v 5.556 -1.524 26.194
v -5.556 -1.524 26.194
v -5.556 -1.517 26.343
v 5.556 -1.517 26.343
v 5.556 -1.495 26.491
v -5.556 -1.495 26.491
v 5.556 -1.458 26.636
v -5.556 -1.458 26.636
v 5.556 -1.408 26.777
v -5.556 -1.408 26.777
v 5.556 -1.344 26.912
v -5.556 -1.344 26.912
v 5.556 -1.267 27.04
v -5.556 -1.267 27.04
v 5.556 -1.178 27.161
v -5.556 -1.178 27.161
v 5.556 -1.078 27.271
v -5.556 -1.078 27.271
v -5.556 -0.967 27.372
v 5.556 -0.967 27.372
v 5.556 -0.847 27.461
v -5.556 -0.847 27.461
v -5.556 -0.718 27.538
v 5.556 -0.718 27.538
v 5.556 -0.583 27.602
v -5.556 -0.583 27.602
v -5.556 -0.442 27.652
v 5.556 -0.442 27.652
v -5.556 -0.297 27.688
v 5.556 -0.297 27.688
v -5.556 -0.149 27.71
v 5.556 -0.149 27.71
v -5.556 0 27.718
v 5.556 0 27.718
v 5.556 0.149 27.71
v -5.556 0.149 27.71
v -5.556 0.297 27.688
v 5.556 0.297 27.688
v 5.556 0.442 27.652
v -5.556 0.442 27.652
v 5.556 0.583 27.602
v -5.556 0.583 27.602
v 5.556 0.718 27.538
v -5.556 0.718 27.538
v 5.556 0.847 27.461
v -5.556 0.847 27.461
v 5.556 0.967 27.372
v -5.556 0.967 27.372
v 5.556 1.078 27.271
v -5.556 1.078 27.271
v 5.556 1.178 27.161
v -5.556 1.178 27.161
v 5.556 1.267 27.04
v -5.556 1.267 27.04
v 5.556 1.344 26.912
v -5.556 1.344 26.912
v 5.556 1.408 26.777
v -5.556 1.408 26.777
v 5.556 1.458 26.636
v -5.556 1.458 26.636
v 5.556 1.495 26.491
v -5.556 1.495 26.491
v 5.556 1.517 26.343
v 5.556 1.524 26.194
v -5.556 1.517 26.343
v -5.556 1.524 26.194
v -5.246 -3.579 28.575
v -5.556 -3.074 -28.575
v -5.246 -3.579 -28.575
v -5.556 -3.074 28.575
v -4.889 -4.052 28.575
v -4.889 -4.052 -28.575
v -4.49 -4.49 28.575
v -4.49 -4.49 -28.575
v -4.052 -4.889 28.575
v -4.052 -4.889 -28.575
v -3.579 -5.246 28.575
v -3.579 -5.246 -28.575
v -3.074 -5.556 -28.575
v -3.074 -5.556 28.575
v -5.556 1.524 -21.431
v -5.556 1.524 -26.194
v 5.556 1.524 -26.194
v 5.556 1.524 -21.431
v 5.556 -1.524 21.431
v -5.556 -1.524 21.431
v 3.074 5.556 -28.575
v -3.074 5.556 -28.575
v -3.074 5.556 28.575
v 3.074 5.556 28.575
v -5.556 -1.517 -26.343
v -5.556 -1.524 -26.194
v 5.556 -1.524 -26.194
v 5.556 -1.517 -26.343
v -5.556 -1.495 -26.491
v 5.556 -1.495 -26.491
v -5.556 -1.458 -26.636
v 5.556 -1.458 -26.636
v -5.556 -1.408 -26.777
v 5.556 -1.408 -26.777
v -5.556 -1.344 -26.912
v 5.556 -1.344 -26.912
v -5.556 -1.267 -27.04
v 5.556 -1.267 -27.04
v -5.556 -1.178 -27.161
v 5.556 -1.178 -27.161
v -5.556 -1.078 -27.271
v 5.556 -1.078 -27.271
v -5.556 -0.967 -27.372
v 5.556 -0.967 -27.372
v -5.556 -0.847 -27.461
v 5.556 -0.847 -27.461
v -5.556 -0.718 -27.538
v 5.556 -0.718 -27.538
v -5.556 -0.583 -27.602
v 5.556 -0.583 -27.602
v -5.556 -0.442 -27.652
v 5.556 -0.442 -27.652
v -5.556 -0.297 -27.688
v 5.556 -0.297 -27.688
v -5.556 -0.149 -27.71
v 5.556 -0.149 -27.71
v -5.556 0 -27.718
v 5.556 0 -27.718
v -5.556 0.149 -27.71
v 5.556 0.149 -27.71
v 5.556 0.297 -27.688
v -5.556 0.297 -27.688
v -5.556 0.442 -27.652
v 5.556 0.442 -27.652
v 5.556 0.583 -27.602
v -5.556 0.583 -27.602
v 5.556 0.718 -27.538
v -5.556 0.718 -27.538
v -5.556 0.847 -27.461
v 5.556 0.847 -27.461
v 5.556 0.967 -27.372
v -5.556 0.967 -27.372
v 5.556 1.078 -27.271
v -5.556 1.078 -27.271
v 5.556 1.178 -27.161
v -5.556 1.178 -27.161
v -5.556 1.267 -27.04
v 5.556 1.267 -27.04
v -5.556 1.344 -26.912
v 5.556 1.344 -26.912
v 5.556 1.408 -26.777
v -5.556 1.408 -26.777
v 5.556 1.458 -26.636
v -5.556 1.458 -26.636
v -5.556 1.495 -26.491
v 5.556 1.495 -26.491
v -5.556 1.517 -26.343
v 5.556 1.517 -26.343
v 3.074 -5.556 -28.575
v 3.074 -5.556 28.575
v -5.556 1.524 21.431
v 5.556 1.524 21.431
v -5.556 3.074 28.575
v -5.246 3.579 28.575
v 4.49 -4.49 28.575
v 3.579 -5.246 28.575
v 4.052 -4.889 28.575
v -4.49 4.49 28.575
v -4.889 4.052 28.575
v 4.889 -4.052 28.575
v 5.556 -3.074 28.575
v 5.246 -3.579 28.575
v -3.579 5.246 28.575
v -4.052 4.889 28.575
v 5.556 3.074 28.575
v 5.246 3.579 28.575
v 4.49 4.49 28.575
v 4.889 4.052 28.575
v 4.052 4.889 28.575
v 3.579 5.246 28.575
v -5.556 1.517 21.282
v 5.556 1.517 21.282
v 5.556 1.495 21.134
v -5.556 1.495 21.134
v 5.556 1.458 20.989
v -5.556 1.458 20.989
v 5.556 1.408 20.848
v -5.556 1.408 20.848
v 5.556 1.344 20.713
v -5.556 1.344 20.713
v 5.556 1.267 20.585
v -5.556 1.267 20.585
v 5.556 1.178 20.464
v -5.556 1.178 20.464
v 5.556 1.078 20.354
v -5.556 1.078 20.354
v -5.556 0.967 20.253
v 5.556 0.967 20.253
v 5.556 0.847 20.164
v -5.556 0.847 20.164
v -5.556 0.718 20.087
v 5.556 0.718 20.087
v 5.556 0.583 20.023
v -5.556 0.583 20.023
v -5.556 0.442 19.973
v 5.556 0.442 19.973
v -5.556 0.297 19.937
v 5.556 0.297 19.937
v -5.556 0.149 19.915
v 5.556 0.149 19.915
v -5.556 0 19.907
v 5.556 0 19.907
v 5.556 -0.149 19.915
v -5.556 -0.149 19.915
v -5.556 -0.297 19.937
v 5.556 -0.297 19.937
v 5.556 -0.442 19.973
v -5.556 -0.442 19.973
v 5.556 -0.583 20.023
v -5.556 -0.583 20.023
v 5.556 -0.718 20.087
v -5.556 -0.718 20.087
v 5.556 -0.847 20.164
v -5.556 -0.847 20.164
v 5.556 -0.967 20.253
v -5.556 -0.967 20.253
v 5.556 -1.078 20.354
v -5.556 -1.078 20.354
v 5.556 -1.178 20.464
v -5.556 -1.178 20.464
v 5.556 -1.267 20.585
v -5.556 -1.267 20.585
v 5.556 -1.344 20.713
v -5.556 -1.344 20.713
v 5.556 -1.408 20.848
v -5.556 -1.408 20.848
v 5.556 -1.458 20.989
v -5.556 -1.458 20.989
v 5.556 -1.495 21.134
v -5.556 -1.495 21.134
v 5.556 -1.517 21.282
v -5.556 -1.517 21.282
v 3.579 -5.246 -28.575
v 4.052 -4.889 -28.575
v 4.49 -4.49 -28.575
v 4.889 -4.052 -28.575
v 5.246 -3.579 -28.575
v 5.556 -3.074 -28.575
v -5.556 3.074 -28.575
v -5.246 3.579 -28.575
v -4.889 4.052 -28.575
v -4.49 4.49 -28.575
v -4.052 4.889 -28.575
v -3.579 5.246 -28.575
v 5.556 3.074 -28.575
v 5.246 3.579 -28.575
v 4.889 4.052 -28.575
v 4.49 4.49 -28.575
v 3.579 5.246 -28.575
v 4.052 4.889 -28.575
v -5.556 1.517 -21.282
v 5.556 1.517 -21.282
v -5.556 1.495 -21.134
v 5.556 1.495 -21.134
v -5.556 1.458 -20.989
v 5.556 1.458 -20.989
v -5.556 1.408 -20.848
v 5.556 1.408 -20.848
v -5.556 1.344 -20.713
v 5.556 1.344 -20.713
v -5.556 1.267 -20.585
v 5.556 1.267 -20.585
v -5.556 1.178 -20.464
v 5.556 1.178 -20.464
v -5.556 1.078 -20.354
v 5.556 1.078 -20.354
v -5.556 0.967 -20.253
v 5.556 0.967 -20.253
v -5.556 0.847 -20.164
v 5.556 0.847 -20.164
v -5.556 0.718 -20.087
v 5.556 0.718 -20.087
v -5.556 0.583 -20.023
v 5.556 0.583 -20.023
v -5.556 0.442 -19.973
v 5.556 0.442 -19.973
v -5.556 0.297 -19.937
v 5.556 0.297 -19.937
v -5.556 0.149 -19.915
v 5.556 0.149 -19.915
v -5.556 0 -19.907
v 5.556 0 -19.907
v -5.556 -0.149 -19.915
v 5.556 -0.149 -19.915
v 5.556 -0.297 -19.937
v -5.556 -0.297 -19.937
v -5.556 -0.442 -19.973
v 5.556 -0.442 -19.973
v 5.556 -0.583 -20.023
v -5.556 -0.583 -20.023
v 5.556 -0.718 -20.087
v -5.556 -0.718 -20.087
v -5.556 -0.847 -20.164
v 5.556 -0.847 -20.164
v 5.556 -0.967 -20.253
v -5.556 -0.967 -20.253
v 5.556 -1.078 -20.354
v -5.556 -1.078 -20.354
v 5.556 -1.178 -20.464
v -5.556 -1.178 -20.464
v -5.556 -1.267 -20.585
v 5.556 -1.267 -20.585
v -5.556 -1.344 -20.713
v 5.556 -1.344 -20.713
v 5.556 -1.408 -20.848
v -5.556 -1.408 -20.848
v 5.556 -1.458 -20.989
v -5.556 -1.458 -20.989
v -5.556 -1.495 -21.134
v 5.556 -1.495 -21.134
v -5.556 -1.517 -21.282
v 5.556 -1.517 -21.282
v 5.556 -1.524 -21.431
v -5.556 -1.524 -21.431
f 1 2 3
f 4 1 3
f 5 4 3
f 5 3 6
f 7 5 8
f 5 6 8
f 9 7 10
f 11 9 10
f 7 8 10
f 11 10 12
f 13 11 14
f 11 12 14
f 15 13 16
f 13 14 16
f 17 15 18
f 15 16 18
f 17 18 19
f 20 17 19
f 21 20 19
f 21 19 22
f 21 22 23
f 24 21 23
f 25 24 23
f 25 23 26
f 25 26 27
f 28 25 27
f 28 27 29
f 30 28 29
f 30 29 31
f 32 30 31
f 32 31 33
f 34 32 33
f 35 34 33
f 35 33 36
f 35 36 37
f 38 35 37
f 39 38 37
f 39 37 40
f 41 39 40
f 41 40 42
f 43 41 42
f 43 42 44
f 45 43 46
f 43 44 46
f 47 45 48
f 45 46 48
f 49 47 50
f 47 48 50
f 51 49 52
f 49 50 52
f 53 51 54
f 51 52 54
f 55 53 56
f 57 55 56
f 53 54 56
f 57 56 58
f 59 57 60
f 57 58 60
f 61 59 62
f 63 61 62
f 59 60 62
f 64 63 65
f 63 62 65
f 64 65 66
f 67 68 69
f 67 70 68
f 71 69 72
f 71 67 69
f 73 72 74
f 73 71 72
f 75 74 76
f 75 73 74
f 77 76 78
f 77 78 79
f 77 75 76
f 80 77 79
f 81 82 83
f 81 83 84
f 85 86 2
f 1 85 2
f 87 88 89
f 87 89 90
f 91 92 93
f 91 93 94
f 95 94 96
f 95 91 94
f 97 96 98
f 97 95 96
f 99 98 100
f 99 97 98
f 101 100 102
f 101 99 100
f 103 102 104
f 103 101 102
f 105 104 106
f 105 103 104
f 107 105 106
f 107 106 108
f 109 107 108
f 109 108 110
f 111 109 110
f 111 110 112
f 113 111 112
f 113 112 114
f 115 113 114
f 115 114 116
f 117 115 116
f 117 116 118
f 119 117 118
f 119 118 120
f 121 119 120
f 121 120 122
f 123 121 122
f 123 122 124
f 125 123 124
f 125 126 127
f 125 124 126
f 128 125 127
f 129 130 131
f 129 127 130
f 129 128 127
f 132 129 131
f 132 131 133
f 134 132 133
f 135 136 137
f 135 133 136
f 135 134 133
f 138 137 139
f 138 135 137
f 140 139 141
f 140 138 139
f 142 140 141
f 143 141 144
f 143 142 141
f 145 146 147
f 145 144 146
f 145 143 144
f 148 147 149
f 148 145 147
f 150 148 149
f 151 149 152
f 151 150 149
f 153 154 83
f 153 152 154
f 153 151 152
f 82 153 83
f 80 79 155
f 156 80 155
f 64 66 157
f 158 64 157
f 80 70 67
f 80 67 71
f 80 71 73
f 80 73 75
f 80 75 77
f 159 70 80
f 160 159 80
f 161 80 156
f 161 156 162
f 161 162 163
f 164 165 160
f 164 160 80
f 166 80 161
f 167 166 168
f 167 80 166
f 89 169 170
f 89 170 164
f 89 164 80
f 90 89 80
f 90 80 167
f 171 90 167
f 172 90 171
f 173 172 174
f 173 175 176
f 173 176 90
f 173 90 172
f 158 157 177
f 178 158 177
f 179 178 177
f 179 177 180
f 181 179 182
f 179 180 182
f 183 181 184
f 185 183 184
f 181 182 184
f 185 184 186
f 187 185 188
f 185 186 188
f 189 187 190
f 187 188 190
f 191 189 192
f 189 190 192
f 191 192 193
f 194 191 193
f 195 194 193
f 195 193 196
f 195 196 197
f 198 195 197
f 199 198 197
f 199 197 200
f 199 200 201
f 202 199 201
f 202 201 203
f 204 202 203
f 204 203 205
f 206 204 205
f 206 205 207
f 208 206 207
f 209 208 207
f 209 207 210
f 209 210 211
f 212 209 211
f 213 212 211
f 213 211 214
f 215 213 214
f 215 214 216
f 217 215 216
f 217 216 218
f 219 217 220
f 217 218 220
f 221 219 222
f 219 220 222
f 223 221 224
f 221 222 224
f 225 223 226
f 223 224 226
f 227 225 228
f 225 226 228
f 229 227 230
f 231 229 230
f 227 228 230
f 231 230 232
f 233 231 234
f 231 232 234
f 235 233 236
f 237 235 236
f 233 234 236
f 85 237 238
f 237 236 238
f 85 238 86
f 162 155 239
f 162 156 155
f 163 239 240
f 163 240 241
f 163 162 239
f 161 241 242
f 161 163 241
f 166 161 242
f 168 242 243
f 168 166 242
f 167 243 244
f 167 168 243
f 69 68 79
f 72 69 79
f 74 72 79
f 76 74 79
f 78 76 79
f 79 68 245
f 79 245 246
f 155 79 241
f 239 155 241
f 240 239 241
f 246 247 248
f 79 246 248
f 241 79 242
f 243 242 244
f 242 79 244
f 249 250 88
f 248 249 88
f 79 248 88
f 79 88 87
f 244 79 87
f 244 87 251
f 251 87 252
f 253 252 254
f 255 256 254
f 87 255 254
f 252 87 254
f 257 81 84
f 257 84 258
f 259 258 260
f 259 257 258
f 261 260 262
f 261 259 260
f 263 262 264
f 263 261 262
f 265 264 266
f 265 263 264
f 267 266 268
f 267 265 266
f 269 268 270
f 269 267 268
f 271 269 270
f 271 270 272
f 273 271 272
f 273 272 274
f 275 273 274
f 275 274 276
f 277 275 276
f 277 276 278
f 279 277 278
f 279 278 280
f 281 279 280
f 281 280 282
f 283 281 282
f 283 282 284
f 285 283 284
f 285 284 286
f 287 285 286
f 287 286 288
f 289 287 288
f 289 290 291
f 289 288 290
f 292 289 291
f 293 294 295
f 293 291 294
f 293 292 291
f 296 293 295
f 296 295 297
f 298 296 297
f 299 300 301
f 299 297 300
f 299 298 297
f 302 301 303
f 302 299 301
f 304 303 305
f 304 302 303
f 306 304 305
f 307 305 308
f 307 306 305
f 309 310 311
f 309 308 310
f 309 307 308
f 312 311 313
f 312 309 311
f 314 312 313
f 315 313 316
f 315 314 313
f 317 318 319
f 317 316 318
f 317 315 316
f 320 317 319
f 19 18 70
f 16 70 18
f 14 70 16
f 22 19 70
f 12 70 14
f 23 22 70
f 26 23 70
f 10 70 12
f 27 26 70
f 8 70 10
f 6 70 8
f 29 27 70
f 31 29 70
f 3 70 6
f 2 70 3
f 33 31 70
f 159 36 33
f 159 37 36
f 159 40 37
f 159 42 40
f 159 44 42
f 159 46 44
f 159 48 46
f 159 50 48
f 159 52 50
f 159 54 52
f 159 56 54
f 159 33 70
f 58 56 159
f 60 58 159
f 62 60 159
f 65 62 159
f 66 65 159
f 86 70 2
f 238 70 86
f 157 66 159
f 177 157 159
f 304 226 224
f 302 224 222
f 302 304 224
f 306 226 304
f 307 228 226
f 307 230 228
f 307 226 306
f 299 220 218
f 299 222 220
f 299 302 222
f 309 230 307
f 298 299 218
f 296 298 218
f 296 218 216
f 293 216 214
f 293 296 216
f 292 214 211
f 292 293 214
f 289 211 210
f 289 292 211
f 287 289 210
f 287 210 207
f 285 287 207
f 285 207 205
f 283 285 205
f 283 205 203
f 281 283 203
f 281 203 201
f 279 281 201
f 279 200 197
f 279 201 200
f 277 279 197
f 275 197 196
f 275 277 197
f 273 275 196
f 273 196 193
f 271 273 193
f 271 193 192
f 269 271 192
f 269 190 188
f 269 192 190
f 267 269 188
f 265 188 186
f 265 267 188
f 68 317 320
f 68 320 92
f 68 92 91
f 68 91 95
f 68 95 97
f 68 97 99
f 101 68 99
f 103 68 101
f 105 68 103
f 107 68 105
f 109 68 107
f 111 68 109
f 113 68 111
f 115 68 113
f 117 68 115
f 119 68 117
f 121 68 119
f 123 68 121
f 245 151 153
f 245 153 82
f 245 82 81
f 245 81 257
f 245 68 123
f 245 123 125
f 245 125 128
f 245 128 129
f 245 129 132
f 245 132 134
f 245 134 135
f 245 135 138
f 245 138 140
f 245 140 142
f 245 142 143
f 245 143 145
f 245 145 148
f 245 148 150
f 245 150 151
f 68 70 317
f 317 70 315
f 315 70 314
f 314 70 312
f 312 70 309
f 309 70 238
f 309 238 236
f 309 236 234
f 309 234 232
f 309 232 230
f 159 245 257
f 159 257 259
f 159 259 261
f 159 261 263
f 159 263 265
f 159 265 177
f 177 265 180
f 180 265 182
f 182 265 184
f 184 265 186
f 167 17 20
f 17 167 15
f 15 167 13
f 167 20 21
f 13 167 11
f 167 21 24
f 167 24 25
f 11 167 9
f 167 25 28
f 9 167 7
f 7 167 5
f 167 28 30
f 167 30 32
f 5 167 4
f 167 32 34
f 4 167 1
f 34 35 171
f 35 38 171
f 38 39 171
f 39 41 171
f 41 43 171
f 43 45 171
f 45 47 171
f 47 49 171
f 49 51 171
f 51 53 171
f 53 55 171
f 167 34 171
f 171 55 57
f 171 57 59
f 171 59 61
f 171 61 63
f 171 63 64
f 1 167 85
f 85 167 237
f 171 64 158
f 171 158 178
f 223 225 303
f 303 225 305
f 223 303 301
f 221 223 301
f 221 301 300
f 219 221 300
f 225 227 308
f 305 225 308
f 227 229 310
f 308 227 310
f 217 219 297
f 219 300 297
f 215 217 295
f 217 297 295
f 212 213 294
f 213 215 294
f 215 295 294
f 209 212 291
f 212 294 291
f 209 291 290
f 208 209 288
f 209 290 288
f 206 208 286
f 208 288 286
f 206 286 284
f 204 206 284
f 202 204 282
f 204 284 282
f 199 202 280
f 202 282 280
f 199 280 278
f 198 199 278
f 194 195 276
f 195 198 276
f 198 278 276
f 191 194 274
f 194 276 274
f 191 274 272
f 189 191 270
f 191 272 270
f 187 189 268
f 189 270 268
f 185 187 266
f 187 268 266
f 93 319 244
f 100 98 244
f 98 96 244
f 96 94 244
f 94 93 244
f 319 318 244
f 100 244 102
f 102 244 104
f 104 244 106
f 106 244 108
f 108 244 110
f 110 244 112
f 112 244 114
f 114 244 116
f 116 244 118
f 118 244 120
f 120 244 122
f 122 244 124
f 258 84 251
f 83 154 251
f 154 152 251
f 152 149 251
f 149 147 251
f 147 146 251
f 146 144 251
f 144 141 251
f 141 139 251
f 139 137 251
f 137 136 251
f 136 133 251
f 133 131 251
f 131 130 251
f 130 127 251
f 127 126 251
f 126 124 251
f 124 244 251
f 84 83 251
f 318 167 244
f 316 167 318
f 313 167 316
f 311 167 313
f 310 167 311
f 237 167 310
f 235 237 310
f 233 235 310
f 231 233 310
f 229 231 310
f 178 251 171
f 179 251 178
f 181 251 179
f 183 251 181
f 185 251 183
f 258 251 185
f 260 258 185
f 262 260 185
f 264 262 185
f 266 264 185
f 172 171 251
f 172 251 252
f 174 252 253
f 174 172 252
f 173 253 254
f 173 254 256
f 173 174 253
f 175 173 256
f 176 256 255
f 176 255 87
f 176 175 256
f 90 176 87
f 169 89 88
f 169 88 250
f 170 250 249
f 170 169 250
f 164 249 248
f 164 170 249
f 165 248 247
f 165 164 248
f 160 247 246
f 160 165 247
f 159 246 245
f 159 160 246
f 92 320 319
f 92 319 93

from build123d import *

# Parameters (mm, degrees)
SKETCH1_R               = 6.35
BOSS_EXTRUDE1_DEPTH     = 28.575
CUT_EXTRUDE1_DEPTH      = 28.575
CUT_EXTRUDE1_DEPTH_BACK = 28.575
SKETCH3_OUTSIDE_W       = 26.682
SKETCH3_OUTSIDE_H       = 26.682
SKETCH3_OUTSIDE_W_2     = 11.1125
SKETCH3_OUTSIDE_H_2     = 11.1125
CUT_EXTRUDE2_REACH      = 33.159


with BuildPart() as part:
    # Sketch1 → Boss-Extrude1 (new, symmetric)
    with BuildSketch(Plane.XY):
        Circle(SKETCH1_R)
    extrude(amount=BOSS_EXTRUDE1_DEPTH, both=True)

    # Sketch3 outside → Cut-Extrude1 (cut, two sides: drawn at the far end of the back side and taken through both)
    with BuildSketch(Plane.XY.offset(-CUT_EXTRUDE1_DEPTH_BACK)):
        Rectangle(SKETCH3_OUTSIDE_W, SKETCH3_OUTSIDE_H)
        Rectangle(SKETCH3_OUTSIDE_W_2, SKETCH3_OUTSIDE_H_2, mode=Mode.SUBTRACT)
    extrude(amount=CUT_EXTRUDE1_DEPTH + CUT_EXTRUDE1_DEPTH_BACK, mode=Mode.SUBTRACT)

    # Sketch4 → Cut-Extrude2 (cut, up to next)
    with BuildSketch(Plane.ZY.offset(5.55625), mode=Mode.PRIVATE) as cut_extrude2_sk1:
        with BuildLine():
            Line((-26.19375, 1.524), (-21.43125, 1.524))
            ThreePointArc((-21.43125, 1.524), (-19.90725, 0), (-21.43125, -1.524))
            Line((-21.43125, -1.524), (-26.19375, -1.524))
            ThreePointArc((-26.19375, -1.524), (-27.71775, 0), (-26.19375, 1.524))
        make_face()
    cut_extrude2_tool1 = extrude(cut_extrude2_sk1.sketch, amount=-CUT_EXTRUDE2_REACH, mode=Mode.PRIVATE) & part.part
    # Sketch4 → Cut-Extrude2 (cut, up to next)
    with BuildSketch(Plane.ZY.offset(5.55625), mode=Mode.PRIVATE) as cut_extrude2_sk2:
        with BuildLine():
            Line((26.19375, 1.524), (21.43125, 1.524))
            ThreePointArc((21.43125, 1.524), (19.90725, 0), (21.43125, -1.524))
            Line((21.43125, -1.524), (26.19375, -1.524))
            ThreePointArc((26.19375, -1.524), (27.71775, 0), (26.19375, 1.524))
        make_face()
    cut_extrude2_tool2 = extrude(cut_extrude2_sk2.sketch, amount=-CUT_EXTRUDE2_REACH, mode=Mode.PRIVATE) & part.part
    add(cut_extrude2_tool1.solids().sort_by_distance((-5.55625, 0, -23.8125))[0], mode=Mode.SUBTRACT)
    add(cut_extrude2_tool2.solids().sort_by_distance((-5.55625, 0, 23.8125))[0], mode=Mode.SUBTRACT)


solid = part.part
